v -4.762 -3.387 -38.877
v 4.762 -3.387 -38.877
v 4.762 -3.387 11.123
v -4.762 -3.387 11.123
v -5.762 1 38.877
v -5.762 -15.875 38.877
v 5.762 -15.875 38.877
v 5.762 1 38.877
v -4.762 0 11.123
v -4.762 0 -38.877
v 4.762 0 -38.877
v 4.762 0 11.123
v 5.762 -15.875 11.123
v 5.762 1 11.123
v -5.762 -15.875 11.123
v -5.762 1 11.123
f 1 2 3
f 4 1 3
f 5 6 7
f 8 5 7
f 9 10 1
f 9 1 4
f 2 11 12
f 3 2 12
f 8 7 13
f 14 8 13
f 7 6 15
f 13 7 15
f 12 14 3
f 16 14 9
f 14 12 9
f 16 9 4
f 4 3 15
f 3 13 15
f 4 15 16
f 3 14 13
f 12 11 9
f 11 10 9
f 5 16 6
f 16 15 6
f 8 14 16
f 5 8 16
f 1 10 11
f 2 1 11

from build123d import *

# Parameters (mm, degrees)
F0_W     = 9.525
F0_H     = 77.75448
F1_DEPTH = 15.875
F2_W     = 12.4875006322
F2_H     = 50
F3_DEPTH = 25
F5_DEPTH = 1
F7_DEPTH = 1
F9_DEPTH = 1


with BuildPart() as f1:
    # F0 (on Front) → F1 (new body)
    with BuildSketch(Plane.XZ):
        Rectangle(F0_W, F0_H)
    extrude(amount=F1_DEPTH)

    # F2 (on face) → F3 (cut)
    with BuildSketch(Plane.YZ.offset(4.7625)):
        with Locations((-9.6312496839, -13.87724)):
            Rectangle(F2_W, F2_H)
    extrude(amount=-F3_DEPTH, mode=Mode.SUBTRACT)

    # F4 (on face) → F5 (join)
    with BuildSketch(Plane(origin=(-4.7625, 0, 0), x_dir=(0, -1, 0), z_dir=(-1, 0, 0))):
        Polygon((0, 11.12276), (3.3874993678, 11.12276), (15.875, 11.12276), (15.875, 38.87724), (0, 38.87724), align=None)
    extrude(amount=F5_DEPTH)

    # F6 (on face) → F7 (join)
    with BuildSketch(Plane.YZ.offset(4.7625)):
        Polygon((-15.875, 11.12276), (-3.3874993678, 11.12276), (0, 11.12276), (0, 38.87724), (-15.875, 38.87724), align=None)
    extrude(amount=F7_DEPTH)

    # F8 (on face) → F9 (join)
    with BuildSketch(Plane(origin=(0, 0, 0), x_dir=(-1, 0, 0), z_dir=(0, 1, 0))):
        Polygon((-5.7625, 38.87724), (-5.7625, 11.12276), (-4.7625, 11.12276), (4.7625, 11.12276), (5.7625, 11.12276), (5.7625, 38.87724), align=None)
    extrude(amount=F9_DEPTH)


solid = f1.part
